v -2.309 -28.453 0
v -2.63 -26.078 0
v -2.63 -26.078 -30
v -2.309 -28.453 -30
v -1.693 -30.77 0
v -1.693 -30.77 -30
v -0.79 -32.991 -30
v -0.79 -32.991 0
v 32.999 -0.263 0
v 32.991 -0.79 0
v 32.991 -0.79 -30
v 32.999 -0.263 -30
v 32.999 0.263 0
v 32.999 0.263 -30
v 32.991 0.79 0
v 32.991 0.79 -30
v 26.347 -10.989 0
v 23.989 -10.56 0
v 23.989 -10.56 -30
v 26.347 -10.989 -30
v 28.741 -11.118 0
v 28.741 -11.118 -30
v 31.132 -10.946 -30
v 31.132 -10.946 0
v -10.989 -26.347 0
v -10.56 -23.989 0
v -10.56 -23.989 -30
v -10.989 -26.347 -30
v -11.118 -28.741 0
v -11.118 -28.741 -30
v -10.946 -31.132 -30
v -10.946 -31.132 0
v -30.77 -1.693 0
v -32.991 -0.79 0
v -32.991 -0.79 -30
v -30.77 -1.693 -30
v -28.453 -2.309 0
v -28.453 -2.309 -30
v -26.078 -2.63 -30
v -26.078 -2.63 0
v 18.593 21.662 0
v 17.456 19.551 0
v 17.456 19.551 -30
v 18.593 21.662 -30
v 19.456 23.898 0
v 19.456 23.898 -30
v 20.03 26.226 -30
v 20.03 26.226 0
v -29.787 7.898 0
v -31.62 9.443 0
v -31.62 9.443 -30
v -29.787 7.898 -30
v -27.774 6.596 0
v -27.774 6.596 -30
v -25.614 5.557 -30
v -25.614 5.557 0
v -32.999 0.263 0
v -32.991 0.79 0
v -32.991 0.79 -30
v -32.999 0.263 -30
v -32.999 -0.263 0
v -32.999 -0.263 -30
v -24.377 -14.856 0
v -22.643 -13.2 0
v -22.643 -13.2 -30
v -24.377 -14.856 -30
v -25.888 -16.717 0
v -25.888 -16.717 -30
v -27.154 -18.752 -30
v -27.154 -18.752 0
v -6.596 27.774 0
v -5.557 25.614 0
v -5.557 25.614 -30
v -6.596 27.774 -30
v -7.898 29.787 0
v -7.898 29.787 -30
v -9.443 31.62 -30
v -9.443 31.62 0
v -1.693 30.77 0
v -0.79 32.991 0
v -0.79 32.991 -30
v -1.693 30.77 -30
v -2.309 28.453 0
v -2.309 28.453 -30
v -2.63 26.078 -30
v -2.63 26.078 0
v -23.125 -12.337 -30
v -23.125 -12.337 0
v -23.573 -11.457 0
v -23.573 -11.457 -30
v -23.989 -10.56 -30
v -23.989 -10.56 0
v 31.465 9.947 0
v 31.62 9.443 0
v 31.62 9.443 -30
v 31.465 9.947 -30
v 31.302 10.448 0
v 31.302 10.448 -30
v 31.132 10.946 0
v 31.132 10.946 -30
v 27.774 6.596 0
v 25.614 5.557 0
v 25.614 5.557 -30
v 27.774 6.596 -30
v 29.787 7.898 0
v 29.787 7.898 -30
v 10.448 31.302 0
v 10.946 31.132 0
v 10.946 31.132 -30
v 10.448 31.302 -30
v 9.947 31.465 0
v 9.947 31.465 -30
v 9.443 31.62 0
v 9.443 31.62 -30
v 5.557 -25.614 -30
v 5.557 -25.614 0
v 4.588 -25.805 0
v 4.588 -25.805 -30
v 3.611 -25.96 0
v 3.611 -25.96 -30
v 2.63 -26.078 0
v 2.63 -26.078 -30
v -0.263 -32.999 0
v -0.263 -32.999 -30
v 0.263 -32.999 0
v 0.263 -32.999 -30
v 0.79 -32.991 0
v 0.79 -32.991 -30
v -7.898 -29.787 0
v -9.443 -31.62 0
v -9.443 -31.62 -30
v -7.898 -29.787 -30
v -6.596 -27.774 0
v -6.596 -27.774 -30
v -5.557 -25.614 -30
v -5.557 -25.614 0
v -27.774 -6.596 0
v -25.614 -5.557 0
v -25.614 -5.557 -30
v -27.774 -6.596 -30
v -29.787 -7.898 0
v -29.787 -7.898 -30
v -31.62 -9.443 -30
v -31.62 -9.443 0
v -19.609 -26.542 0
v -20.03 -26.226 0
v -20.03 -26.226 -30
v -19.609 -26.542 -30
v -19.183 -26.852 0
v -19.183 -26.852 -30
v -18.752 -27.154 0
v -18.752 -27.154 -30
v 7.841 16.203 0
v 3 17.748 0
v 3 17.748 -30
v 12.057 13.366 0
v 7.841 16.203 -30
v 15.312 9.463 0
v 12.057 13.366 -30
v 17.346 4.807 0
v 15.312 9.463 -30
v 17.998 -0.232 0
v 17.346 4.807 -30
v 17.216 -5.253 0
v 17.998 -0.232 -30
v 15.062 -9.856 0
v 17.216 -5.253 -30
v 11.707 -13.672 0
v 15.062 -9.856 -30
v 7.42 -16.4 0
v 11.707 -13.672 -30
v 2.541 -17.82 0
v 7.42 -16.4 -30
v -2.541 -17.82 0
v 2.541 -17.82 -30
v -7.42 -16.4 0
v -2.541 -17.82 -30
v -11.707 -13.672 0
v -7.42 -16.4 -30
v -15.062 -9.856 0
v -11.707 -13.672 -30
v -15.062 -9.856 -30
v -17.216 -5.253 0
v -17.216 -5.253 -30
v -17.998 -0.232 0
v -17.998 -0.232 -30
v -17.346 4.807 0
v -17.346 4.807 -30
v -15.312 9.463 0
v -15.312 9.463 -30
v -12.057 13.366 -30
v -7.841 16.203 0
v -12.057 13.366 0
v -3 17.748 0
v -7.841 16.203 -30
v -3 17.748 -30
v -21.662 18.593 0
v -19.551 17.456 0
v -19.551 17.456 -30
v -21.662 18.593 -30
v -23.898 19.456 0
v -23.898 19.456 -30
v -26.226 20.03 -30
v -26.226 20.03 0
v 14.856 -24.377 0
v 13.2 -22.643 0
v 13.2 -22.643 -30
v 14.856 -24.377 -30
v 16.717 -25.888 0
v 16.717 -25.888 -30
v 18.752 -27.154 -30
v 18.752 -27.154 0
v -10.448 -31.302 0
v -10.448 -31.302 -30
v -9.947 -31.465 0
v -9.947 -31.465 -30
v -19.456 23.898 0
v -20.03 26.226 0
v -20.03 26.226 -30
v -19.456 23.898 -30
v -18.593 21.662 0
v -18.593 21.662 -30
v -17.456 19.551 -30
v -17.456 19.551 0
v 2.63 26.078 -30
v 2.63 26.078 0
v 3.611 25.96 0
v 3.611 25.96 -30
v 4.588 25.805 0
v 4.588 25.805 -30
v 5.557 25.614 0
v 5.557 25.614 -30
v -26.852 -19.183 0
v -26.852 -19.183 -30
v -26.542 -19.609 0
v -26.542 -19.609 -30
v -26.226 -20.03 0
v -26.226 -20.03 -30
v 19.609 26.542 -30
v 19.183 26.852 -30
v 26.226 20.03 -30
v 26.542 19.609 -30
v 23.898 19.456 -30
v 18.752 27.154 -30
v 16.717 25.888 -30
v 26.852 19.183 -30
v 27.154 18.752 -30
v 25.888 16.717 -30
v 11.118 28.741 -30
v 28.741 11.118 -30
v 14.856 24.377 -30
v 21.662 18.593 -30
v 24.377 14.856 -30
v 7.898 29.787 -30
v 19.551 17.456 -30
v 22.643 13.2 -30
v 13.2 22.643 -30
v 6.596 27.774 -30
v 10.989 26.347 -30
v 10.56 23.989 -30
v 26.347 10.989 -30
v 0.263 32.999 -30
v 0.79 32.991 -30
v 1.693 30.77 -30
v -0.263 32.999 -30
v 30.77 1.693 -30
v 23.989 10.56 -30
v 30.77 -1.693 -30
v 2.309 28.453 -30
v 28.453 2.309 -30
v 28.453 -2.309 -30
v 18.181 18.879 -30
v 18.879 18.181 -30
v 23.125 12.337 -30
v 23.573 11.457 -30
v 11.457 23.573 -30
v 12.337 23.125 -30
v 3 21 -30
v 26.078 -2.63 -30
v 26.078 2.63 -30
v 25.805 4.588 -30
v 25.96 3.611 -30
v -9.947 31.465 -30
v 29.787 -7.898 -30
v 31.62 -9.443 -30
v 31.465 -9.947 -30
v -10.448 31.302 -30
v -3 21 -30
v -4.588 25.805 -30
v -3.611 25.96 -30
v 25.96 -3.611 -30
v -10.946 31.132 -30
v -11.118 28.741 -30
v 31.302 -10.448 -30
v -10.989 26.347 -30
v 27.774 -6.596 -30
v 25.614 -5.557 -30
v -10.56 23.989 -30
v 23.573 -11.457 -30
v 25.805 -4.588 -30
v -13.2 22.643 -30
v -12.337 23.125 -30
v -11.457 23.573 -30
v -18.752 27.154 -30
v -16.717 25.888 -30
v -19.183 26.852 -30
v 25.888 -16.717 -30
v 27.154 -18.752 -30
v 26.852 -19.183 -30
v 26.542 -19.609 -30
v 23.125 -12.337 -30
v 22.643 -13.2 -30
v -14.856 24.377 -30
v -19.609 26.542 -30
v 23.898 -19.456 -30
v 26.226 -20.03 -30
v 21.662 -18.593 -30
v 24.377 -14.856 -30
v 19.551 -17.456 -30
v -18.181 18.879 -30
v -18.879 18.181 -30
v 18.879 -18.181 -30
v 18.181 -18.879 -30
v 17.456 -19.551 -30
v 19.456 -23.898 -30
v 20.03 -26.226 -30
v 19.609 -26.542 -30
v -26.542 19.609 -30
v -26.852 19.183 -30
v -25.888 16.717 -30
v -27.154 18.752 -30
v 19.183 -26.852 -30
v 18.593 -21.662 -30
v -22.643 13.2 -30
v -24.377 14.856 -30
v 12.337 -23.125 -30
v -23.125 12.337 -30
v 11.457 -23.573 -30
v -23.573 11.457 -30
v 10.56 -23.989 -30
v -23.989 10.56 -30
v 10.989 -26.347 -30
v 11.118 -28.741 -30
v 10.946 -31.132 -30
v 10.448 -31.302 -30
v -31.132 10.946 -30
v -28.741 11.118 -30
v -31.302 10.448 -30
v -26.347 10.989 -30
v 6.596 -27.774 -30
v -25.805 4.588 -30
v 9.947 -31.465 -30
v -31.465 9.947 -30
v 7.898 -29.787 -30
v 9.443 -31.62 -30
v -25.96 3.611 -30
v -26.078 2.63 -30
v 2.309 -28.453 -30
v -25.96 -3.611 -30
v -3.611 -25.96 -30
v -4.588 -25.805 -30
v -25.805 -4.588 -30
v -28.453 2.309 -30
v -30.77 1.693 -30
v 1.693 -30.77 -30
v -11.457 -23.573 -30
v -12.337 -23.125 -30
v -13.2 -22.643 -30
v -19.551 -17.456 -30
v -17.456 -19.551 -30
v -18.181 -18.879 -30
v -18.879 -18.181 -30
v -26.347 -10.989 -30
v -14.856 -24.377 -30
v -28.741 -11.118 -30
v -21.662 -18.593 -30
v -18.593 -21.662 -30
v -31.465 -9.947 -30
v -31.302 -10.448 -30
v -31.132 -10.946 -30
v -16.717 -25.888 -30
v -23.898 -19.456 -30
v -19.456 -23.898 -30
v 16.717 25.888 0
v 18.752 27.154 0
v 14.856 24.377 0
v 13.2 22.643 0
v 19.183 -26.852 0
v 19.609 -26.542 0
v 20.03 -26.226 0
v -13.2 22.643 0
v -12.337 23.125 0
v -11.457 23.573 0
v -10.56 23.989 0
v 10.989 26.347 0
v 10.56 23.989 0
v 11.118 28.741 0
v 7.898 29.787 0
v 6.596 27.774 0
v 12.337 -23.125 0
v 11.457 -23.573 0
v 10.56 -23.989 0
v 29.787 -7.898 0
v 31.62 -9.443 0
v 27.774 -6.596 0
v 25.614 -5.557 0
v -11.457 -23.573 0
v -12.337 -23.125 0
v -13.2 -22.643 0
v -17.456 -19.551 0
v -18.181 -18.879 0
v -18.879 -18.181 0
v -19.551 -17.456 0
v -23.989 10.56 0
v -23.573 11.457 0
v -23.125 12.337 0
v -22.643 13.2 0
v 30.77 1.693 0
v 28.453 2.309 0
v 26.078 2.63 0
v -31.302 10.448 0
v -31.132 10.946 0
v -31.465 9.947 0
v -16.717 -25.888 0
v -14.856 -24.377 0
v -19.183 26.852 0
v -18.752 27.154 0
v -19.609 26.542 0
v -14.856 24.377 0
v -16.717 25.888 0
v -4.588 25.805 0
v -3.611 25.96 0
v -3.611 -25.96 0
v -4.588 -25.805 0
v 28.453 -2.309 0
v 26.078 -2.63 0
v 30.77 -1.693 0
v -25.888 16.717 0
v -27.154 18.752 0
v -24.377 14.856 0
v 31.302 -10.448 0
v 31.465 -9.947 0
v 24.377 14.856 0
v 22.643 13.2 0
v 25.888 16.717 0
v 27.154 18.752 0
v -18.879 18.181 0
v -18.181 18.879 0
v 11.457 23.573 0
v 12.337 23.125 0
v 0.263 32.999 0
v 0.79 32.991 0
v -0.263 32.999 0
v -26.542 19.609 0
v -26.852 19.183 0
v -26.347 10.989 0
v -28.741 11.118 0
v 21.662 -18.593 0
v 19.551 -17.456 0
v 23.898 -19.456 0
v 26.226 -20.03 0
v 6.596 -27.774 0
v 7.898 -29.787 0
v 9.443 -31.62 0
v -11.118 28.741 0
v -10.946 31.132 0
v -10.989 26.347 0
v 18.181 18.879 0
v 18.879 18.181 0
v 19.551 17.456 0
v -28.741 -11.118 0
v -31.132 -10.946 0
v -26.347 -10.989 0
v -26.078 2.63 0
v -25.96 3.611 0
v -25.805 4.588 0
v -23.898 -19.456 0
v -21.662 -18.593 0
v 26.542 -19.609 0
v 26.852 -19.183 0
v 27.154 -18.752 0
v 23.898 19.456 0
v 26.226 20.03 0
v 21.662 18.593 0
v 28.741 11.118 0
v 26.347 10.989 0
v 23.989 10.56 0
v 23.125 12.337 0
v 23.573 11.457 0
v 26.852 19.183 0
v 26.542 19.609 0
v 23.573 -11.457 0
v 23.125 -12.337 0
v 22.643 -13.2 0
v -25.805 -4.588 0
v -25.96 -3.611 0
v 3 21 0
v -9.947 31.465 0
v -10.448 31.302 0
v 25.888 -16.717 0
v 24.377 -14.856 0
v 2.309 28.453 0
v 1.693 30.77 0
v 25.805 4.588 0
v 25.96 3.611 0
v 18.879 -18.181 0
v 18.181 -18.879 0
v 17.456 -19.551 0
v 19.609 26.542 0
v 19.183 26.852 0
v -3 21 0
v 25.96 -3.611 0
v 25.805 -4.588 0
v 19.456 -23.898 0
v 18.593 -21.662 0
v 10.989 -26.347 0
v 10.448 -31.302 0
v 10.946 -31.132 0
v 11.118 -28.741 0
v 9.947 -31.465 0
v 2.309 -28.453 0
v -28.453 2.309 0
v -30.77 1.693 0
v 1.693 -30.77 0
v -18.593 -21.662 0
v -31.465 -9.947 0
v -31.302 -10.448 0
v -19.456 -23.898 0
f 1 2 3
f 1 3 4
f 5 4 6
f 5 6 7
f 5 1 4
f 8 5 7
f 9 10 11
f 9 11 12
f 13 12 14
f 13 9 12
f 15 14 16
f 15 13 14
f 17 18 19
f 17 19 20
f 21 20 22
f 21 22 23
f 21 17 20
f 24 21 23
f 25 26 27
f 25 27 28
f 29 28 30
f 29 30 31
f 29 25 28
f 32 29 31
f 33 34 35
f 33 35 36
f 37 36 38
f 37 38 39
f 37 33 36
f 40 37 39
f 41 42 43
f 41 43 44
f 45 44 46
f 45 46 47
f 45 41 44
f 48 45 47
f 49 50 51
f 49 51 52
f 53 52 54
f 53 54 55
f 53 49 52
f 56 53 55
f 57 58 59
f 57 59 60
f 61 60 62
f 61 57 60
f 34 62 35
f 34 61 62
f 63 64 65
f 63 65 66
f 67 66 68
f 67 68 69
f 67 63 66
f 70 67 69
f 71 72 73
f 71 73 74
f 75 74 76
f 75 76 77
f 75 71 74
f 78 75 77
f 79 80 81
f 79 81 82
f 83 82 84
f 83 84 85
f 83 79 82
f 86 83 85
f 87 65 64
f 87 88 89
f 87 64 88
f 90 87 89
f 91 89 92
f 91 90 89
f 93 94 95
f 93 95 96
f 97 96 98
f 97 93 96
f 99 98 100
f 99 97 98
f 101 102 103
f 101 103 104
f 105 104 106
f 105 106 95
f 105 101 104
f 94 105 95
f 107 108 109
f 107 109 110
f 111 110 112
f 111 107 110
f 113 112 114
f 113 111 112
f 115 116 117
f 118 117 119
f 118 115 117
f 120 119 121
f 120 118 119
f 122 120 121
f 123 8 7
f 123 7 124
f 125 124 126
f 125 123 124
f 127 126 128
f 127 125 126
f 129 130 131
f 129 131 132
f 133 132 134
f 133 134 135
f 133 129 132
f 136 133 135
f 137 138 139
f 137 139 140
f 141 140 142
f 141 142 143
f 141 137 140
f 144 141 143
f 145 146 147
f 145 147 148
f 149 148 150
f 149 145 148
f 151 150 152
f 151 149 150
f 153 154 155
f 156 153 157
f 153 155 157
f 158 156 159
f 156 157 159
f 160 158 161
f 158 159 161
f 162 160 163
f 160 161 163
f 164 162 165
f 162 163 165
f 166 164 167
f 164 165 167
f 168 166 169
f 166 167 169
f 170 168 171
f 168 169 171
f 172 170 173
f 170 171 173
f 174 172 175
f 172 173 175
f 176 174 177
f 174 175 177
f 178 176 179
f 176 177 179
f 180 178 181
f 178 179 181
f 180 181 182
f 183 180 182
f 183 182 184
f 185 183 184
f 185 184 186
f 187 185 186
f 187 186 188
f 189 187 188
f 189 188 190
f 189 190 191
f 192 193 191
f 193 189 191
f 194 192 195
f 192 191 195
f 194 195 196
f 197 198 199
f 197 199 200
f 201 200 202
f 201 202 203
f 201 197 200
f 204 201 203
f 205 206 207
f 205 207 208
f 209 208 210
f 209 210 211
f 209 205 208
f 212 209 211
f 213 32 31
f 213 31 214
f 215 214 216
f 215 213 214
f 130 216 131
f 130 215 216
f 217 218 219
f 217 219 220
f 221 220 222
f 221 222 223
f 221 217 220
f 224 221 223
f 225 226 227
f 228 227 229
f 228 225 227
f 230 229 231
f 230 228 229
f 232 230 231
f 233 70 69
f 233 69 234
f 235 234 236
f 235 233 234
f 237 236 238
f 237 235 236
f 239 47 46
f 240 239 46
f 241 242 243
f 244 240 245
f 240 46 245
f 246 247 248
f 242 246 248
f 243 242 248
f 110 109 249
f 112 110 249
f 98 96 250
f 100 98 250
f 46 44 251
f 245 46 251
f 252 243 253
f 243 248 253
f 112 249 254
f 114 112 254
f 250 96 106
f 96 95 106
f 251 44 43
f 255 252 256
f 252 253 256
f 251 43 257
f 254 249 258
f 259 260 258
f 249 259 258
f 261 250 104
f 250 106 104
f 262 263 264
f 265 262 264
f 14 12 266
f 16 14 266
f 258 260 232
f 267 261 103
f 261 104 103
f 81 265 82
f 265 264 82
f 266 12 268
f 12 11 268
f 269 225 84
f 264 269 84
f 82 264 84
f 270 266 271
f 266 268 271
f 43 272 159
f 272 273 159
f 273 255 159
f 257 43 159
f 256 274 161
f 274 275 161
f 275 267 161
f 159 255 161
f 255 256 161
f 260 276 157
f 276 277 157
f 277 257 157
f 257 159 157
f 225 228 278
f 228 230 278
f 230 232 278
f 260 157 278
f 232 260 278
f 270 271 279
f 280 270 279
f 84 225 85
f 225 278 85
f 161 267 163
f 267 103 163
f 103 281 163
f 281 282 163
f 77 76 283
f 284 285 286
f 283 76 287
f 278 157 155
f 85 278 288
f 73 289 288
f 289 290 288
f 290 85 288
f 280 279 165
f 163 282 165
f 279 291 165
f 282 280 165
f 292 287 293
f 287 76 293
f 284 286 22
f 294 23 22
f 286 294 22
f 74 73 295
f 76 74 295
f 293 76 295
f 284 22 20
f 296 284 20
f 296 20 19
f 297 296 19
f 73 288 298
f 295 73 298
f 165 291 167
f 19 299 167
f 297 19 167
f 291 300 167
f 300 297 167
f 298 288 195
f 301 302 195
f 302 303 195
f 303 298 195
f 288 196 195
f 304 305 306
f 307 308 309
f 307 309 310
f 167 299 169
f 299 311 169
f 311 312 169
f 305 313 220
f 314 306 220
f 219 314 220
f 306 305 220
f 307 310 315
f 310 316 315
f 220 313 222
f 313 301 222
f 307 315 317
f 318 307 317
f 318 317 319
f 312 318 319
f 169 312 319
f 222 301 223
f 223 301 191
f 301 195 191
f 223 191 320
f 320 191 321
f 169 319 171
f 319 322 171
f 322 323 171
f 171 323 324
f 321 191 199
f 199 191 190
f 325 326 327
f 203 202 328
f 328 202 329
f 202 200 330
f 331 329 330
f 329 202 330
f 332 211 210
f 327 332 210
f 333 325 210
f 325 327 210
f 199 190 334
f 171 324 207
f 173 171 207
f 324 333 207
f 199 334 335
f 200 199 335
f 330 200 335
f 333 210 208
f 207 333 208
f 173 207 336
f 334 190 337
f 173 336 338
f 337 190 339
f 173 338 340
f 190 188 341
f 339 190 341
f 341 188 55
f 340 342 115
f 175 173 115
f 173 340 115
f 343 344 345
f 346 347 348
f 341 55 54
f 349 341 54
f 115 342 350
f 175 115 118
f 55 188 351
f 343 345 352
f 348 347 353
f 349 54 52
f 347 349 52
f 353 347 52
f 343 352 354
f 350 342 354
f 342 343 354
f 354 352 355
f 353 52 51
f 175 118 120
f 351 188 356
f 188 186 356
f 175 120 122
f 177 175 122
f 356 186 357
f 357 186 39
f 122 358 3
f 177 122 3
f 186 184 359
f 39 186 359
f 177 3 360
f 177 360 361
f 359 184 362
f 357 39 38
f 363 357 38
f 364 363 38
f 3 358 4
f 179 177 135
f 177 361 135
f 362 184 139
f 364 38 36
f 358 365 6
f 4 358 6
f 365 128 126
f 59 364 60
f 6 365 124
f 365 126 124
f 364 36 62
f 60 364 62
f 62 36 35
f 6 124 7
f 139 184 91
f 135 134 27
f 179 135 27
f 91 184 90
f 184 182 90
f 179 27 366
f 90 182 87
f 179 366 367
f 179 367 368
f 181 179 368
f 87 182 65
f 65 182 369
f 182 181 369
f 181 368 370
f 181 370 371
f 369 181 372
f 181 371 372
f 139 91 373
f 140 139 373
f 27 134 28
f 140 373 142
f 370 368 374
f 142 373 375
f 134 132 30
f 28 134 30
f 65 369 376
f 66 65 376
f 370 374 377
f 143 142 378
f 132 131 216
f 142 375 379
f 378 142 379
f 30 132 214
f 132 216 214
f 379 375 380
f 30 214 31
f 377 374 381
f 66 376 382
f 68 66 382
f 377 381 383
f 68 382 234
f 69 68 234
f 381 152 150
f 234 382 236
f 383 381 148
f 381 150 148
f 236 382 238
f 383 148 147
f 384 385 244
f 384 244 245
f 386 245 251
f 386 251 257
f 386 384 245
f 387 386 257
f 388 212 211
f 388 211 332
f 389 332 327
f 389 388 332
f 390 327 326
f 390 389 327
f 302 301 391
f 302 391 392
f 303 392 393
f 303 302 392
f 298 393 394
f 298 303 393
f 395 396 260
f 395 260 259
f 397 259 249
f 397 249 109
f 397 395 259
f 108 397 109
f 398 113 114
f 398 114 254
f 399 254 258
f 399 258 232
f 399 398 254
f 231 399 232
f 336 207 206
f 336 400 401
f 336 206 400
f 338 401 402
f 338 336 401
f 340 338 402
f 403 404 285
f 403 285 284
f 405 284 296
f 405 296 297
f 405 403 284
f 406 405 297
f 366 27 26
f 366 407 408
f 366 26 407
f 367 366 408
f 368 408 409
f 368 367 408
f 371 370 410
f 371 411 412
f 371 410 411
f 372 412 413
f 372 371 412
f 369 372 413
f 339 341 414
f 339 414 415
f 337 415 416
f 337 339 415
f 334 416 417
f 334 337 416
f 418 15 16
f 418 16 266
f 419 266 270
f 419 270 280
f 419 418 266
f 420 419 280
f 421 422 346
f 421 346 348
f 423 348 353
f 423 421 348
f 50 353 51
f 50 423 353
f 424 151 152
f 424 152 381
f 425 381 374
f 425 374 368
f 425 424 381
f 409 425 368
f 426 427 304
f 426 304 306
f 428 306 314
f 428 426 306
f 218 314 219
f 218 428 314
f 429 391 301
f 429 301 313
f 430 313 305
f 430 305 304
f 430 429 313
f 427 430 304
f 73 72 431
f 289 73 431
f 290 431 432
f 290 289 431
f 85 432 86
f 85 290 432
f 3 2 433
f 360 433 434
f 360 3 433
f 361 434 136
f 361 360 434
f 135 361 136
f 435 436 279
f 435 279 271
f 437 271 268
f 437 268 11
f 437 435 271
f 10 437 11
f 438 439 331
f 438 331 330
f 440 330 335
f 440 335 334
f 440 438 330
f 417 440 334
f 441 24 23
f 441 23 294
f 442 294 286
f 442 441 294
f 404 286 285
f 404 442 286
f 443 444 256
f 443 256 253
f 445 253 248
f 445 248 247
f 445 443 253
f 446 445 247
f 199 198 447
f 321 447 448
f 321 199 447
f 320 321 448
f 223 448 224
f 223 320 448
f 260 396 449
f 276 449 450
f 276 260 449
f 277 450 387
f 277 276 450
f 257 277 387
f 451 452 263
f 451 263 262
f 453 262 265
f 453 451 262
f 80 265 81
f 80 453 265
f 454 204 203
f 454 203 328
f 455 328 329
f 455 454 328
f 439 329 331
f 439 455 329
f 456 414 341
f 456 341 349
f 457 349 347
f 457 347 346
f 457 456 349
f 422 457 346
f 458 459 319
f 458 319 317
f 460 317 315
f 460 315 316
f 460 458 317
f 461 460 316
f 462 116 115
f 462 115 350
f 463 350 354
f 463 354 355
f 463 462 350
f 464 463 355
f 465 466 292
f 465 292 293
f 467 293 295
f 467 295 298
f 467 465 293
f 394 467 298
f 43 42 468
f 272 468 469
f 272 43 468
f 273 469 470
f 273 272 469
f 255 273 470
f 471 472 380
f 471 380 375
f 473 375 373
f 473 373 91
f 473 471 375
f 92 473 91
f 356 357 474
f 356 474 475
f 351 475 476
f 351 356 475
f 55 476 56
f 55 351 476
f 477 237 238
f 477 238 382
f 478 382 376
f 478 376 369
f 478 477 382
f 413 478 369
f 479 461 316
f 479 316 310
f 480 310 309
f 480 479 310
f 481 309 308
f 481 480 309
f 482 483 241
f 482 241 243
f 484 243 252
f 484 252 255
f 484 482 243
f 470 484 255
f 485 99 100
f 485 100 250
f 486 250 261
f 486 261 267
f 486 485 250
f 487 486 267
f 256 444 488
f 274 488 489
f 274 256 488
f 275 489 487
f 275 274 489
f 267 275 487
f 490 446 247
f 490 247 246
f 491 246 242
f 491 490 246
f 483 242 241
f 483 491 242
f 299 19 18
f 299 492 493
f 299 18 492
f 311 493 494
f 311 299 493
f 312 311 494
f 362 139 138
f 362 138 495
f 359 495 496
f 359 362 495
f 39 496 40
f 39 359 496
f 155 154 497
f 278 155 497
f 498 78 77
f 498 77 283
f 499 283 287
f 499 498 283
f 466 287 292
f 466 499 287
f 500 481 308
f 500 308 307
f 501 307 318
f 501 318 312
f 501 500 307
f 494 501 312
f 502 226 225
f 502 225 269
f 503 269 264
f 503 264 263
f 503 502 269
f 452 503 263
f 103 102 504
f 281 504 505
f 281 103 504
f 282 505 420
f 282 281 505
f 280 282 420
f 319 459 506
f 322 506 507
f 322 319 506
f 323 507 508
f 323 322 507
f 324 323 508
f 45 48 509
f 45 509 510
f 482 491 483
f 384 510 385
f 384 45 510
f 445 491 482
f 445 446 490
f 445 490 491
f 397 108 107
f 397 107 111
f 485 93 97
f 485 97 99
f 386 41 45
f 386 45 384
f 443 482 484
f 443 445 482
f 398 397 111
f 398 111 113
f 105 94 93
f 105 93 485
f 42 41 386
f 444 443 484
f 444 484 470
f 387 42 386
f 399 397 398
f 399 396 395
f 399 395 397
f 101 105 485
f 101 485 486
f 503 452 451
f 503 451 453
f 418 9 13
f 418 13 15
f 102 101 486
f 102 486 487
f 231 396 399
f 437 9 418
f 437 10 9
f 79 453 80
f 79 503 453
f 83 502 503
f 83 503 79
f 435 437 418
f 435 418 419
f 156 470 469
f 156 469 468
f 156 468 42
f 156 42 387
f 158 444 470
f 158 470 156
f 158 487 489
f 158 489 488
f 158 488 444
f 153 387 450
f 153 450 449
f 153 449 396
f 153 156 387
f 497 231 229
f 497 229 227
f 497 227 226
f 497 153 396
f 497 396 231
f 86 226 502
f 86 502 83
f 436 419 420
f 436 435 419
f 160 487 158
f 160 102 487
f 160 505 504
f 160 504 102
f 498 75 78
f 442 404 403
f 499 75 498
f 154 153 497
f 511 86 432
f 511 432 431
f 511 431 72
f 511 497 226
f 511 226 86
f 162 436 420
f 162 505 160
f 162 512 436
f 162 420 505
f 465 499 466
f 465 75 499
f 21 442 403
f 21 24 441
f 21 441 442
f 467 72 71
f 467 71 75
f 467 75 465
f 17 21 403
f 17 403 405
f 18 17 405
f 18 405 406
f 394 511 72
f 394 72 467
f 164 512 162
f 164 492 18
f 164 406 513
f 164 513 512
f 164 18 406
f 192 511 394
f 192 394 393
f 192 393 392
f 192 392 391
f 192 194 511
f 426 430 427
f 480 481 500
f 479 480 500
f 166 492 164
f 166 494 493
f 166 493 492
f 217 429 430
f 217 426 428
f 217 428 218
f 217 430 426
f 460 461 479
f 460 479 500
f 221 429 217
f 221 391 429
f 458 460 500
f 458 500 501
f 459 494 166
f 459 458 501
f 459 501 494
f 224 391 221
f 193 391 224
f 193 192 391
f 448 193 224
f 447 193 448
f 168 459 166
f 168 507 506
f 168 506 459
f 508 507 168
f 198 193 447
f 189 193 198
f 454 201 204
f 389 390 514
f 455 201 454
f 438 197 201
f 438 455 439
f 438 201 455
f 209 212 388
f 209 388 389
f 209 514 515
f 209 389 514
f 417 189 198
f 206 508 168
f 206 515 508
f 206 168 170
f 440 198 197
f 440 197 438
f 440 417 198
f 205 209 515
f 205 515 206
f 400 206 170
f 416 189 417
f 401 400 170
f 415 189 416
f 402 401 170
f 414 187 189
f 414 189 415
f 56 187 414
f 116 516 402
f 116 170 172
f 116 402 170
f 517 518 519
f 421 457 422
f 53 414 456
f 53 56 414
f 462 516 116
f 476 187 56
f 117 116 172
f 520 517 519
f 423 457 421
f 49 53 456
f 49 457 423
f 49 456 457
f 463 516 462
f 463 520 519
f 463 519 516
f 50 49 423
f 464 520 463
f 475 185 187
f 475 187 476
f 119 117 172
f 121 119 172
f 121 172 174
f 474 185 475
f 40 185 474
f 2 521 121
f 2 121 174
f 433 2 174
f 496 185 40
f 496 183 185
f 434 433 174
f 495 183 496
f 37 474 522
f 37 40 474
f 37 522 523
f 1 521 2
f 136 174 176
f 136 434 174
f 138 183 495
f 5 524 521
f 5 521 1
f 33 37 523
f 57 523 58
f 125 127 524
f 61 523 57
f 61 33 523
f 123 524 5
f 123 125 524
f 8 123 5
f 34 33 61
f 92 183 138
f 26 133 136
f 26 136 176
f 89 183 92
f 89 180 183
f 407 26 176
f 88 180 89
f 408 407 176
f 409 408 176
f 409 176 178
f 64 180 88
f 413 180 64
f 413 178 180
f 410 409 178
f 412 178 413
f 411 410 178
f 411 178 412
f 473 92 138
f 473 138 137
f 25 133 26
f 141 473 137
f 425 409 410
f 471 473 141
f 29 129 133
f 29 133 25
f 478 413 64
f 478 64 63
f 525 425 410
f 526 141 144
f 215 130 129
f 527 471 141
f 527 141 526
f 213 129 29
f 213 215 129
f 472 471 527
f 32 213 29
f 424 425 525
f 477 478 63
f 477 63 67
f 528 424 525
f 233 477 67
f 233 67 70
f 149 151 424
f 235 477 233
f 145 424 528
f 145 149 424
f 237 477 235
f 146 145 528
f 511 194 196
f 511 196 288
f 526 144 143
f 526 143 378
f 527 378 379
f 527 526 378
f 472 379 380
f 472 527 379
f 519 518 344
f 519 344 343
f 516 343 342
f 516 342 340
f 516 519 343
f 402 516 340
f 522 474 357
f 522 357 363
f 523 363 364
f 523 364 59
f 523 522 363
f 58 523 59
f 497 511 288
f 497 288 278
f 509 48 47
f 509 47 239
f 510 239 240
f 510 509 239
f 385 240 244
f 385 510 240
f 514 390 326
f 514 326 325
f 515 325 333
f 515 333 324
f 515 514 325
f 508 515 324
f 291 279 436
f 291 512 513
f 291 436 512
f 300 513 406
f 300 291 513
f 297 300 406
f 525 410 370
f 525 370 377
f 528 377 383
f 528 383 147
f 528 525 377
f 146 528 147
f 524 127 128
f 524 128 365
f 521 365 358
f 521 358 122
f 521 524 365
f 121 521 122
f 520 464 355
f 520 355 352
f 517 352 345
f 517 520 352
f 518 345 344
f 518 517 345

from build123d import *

# Parameters (mm, degrees)
SKETCH1_W           = 8.21
SKETCH1_H           = 30
BOSS_EXTRUDE1_DEPTH = 30
CIRPATTERN1_COUNT   = 20
SKETCH3_W           = 6
SKETCH3_H           = 6
CUT_EXTRUDE1_DEPTH  = 56.479726027


with BuildPart() as part:
    # Sketch1 → Revolve1 (revolve)
    with BuildSketch(Plane(origin=(0, 0, 0), x_dir=(1, 0, 0), z_dir=(0, 1, 0))):
        with Locations((22.105, 15)):
            Rectangle(SKETCH1_W, SKETCH1_H)
    revolve(axis=Axis((0, 0, 0), (0, 0, -1)))

    # Sketch2 → Boss-Extrude1 (add)
    with BuildSketch(Plane.XY):
        with BuildLine():
            ThreePointArc((2.63, 26.077714624), (2.037608033, 29.62132863), (0.79, 32.990542584))
            ThreePointArc((0.79, 32.990542584), (0, 33), (-0.79, 32.990542584))
            ThreePointArc((-0.79, 32.990542584), (-2.037608033, 29.62132863), (-2.63, 26.077714624))
            ThreePointArc((-2.63, 26.077714624), (0, 26.21), (2.63, 26.077714624))
        make_face()
    boss_extrude1 = extrude(amount=-BOSS_EXTRUDE1_DEPTH)

    # CirPattern1: Boss-Extrude1 ×20 about axis
    cirpattern1_axis = Axis((0, 0, 0), (0, 0, 1))
    for i in range(1, CIRPATTERN1_COUNT):
        add(boss_extrude1.rotate(cirpattern1_axis, i * 360 / CIRPATTERN1_COUNT))

    # Sketch3 → Cut-Extrude1 (cut, through all)
    with BuildSketch(Plane.XY):
        with Locations((0, 18)):
            Rectangle(SKETCH3_W, SKETCH3_H)
    extrude(amount=-CUT_EXTRUDE1_DEPTH, mode=Mode.SUBTRACT)


solid = part.part
